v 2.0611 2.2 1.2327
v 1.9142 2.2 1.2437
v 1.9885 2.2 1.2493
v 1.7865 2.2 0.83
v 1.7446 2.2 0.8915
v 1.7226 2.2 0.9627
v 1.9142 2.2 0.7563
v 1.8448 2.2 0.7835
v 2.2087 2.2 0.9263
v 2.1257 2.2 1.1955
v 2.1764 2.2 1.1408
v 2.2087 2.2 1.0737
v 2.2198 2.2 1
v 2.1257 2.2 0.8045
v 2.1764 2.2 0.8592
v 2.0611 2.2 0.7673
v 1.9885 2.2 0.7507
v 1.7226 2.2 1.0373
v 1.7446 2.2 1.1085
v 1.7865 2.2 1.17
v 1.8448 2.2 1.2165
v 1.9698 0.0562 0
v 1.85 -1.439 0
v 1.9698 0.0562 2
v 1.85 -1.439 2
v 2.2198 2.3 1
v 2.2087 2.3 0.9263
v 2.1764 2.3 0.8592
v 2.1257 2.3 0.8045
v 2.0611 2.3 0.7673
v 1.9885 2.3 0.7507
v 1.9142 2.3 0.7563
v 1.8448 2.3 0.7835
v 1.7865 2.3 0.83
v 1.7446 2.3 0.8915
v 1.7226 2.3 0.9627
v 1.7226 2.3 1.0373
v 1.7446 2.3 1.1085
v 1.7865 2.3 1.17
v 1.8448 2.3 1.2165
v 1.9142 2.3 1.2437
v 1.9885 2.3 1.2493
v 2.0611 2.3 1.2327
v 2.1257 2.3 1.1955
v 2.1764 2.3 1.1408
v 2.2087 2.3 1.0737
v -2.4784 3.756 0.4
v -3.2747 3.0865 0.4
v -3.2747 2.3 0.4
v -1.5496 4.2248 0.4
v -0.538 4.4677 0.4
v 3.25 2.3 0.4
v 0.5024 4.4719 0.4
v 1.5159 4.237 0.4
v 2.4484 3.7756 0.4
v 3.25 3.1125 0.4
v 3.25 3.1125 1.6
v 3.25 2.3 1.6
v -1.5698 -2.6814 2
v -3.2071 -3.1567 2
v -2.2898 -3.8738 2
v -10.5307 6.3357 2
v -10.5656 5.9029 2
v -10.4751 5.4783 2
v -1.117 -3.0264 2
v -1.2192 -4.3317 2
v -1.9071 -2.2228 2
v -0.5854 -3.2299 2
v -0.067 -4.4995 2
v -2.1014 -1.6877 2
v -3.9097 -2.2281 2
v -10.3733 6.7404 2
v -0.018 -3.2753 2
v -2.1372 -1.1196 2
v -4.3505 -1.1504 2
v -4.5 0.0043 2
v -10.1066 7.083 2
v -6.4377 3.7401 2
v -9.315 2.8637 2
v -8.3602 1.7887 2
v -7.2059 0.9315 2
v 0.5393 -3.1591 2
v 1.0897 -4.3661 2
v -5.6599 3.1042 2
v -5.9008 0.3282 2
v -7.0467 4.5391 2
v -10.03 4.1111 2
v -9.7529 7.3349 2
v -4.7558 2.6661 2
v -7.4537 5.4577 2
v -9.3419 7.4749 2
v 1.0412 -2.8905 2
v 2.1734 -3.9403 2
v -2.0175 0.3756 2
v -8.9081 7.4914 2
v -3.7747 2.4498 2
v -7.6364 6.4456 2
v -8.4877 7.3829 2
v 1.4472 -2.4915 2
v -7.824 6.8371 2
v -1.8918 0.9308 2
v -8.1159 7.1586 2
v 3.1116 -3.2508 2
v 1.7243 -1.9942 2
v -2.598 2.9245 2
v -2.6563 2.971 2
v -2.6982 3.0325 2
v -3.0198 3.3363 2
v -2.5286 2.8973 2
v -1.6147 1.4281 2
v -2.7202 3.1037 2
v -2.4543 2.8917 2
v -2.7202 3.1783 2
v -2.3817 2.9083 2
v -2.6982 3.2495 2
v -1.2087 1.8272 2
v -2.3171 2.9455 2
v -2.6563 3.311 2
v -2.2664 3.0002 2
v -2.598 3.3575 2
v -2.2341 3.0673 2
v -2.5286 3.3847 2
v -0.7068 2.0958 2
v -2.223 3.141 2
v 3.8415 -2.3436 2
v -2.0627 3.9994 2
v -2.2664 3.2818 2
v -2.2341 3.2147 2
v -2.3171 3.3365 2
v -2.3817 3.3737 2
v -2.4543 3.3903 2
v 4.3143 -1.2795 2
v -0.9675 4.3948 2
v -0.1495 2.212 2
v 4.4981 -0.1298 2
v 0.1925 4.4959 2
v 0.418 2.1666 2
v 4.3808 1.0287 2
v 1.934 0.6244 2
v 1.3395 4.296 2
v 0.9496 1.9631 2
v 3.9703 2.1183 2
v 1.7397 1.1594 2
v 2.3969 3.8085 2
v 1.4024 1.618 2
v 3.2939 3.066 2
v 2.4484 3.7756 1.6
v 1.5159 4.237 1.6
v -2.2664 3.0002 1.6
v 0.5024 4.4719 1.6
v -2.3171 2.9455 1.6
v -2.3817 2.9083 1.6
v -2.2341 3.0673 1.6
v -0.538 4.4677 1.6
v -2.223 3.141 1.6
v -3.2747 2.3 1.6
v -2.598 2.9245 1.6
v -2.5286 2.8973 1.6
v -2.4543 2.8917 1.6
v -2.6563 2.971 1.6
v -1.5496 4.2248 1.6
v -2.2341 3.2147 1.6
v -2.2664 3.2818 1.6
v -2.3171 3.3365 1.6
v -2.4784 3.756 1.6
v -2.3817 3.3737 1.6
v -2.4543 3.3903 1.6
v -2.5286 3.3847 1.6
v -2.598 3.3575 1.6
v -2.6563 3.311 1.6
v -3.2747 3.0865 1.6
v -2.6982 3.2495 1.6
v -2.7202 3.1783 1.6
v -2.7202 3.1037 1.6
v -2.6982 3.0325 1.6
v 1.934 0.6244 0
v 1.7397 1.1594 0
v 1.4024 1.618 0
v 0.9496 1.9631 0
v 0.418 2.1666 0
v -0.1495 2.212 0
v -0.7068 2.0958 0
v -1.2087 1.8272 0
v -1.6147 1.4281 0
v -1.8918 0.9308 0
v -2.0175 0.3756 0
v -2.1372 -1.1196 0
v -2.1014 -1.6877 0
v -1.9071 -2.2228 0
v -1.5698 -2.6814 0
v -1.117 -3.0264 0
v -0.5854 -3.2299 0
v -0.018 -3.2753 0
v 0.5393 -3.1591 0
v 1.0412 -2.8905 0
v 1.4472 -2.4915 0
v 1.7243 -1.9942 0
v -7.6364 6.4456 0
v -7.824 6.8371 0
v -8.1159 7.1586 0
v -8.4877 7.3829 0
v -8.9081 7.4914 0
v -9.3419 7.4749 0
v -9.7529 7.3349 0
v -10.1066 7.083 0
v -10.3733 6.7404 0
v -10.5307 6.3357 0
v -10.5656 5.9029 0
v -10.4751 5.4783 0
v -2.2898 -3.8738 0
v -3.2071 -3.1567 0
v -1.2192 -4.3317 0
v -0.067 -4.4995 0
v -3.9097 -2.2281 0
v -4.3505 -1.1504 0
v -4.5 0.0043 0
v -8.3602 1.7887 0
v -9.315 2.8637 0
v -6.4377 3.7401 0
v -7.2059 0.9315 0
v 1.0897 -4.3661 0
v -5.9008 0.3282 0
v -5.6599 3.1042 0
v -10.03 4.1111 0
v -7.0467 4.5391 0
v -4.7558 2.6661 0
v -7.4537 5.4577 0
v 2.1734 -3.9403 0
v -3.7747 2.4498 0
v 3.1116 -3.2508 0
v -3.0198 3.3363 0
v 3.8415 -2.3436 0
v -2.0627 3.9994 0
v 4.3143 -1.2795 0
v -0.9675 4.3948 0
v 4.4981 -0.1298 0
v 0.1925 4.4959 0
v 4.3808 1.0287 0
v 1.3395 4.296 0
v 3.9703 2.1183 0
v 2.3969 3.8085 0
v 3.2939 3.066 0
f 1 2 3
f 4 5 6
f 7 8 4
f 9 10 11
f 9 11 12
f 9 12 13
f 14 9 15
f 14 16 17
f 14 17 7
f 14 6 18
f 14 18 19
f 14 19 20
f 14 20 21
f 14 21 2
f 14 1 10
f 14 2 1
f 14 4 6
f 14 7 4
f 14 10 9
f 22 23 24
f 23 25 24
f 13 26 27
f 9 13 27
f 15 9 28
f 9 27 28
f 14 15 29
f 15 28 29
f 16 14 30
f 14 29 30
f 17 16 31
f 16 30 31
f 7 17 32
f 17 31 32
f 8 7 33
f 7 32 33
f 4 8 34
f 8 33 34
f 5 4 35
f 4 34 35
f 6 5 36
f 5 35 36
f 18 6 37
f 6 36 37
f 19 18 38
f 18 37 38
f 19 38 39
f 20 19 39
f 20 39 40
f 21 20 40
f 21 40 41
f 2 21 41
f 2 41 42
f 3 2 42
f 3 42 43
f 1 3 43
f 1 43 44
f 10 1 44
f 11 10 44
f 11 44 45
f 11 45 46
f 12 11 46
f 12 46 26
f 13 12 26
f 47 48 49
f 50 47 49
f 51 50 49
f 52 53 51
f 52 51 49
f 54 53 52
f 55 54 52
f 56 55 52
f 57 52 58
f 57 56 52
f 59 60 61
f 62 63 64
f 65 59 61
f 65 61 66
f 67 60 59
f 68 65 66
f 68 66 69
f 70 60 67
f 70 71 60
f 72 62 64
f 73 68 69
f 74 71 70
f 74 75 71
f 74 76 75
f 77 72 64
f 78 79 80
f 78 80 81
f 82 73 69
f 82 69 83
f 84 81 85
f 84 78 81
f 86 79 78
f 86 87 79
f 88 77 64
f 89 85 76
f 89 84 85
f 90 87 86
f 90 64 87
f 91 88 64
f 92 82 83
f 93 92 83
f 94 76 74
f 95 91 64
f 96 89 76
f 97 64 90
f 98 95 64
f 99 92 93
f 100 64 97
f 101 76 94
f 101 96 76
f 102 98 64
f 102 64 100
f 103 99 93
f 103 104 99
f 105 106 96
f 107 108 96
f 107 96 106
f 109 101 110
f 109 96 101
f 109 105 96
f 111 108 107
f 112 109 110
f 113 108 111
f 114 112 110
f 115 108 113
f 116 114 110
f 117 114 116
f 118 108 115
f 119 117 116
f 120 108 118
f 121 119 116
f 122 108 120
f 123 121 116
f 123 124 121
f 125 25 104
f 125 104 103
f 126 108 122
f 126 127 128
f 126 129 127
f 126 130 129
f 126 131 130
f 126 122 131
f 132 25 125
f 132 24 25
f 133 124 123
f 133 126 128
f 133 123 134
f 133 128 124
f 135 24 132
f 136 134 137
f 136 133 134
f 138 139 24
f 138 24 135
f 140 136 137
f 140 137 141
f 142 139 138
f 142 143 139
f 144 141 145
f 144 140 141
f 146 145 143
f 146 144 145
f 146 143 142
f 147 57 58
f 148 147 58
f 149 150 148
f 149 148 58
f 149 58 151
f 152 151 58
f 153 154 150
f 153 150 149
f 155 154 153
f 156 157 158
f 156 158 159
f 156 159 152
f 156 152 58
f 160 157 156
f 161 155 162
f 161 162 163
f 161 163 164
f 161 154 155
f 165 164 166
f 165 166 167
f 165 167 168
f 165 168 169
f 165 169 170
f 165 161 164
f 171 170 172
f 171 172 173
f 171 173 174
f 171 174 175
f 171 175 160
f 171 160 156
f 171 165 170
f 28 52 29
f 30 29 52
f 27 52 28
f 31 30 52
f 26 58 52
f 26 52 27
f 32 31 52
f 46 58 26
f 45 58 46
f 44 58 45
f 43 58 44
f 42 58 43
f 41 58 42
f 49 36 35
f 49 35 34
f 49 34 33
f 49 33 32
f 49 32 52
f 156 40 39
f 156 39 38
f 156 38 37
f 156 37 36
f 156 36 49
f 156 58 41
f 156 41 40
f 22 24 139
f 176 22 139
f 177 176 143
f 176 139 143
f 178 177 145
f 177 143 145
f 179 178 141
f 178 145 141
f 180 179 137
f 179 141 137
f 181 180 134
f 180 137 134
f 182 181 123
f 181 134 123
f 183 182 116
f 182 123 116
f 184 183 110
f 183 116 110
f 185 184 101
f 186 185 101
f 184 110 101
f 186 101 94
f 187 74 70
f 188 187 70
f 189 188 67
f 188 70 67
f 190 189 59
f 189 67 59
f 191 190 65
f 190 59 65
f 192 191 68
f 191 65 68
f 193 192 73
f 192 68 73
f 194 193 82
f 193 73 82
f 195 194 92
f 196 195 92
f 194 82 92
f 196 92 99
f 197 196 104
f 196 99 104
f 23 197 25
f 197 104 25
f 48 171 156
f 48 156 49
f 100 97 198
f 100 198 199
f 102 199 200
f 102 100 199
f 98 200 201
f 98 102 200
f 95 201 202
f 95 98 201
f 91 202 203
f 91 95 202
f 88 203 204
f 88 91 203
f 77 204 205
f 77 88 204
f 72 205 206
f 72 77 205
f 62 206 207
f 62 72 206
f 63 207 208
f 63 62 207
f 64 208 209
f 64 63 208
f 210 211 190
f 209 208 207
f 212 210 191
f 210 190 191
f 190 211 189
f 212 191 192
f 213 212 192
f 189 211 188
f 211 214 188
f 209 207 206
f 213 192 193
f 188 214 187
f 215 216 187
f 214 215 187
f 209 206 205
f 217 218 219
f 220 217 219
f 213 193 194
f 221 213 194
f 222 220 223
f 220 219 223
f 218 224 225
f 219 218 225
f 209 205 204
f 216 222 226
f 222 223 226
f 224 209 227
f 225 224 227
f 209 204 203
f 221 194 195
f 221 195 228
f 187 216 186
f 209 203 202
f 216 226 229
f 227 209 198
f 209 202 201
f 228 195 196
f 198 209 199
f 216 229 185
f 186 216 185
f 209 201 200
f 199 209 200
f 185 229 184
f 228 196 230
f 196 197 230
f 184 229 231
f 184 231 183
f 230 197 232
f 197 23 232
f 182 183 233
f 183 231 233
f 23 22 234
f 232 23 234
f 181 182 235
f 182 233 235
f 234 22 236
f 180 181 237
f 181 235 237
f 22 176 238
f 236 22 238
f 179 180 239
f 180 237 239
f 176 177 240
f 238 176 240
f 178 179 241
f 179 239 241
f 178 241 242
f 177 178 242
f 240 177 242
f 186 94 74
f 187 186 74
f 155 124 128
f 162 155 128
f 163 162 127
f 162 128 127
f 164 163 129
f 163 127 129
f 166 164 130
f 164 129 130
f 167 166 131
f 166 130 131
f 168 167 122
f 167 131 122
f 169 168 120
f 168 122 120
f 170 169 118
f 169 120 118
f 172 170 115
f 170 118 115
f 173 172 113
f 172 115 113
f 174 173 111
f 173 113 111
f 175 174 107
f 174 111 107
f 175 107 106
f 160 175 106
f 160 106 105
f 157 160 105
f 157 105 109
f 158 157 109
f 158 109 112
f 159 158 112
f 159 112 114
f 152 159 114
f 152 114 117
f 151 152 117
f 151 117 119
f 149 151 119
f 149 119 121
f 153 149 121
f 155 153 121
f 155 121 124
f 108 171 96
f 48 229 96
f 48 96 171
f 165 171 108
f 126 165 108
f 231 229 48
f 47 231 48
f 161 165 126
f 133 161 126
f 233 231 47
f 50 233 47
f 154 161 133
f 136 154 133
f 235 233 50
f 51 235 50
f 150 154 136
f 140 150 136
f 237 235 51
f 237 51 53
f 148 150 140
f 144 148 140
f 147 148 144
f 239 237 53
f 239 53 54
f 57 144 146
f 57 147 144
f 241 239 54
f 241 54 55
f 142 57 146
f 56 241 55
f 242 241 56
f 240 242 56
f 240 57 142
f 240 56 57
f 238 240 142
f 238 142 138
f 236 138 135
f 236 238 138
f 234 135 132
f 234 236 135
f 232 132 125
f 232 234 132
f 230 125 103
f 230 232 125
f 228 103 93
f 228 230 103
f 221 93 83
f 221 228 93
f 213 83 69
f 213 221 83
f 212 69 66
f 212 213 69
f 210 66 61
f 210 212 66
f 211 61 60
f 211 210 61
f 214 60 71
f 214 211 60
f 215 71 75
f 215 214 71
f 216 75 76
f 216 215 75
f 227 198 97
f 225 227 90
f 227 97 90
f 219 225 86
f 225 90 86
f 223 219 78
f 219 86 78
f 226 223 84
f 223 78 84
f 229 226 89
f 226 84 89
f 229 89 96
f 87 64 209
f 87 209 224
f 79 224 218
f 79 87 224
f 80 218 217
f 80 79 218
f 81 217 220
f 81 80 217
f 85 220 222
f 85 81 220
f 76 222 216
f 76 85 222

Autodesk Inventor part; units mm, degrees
ref_plane "YZ Plane" through (0, 0, 0) normal (1, 0, 0) x (0, 1, 0)
ref_plane "XY Plane" through (0, 0, 0) normal (0, 0, 1) x (1, 0, 0)
sketch "Esboço1" plane through (0, 0, 0) normal (0, 0, 1) x (1, 0, 0)
  circle A0 centre (0, 0) radius 4.5
  dimension "d0" = 9
extrude "Extrusão1" add sketch "Esboço1" along normal blind 2
sketch "Esboço2" plane through (0, 0, 2) normal (0, 0, 1) x (1, 0, 0)
  circle A0 centre (0, 0) radius 4.5 projected
  arc A1 (-10.4751, 5.4783) -> (-4.5, 0.0043) centre (-3.6315, 6.9502) ccw
  arc A2 (-7.6364, 6.4456) -> (-10.4751, 5.4783) centre (-9.0687, 6) ccw
  arc A3 (-7.6364, 6.4456) -> (-3.7747, 2.4498) centre (-3.3457, 6.7283) ccw
  dimension "d3" = 7
  dimension "d4" = 4.3
  dimension "d5" = 1.5
  dimension "d6" = 6
extrude "Extrusão2" add sketch "Esboço2" against normal blind 2 contours A0 A1 A2 A3
sketch "Esboço4" plane through (0, 0, 2) normal (0, 0, 1) x (1, 0, 0)
  line L0 (-0.335, -0.9422) -> (0.1675, 0.4711) construction
  line L1 (-2.0175, 0.3756) -> (-2.1372, -1.1196)
  line L2 (1.85, -1.439) -> (1.9698, 0.0562)
  arc A0 (1.9698, 0.0562) -> (-2.0175, 0.3756) centre (-0.0239, 0.2159) ccw
  arc A1 (-2.1372, -1.1196) -> (1.85, -1.439) centre (-0.1436, -1.2793) ccw
  point P0 (-0.0837, -0.2356)
  dimension "d11" = 1.5
  dimension "d12" = 4
extrude "Extrusão3" cut sketch "Esboço4" against normal blind 2
ref_plane "Plano de trabalho1" through (0, 4.5, 0) normal (0, 1, 0) x (-1, 0, 0)
sketch "Esboço5" plane through (0, 4.5, 0) normal (0, 1, 0) x (-1, 0, 0)
  line L0 (-3.25, 1.6) -> (3.2747, 1.6)
  line L1 (3.2747, 1.6) -> (3.2747, 0.4)
  line L2 (3.2747, 0.4) -> (-3.25, 0.4)
  line L3 (-3.25, 0.4) -> (-3.25, 1.6)
  line L4 (-3.25, 1.6) -> (3.2747, 0.4) construction
  line L5 (3.2747, 1.6) -> (-3.25, 0.4) construction
  line L6 (4.5, 0) -> (-4.5, 0) projected
  line L7 (4.5, 2) -> (-4.5, 2) projected
  line L8 (3.7747, 0) -> (3.7747, 2) projected
  line L9 (-4.5, 2) -> (-4.5, 0)
  line L10 (-4.5, 0) -> (-4.5, 2) projected
  point P0 (0, 0)
  point P1 (0.0124, 1)
  dimension "d16" = 0.4
  dimension "d17" = 0.4
  dimension "d18" = 0.5
  dimension "d19" = 1.25
extrude "Extrusão4" cut sketch "Esboço5" against normal blind 2.2 contours L0 L1 L2 L3
sketch "Esboço6" plane through (0, 0, 2) normal (0, 0, 1) x (1, 0, 0)
  circle A0 centre (-2.473, 3.141) radius 0.25
  line L0 (0, -6.9) -> (0, 9.9) projected
  line L1 (-13.5824, 0) -> (7.5137, 0) projected
  point P0 (0, 0)
  dimension "d22" = 0.5
  dimension "d28" = 2.473
  dimension "d29" = 3.141
extrude "Extrusão5" cut sketch "Esboço6" against normal blind 0.5
sketch "Esboço8" plane through (0, 2.3, 0) normal (0, 1, 0) x (1, 0, 0)
  line L0 (1.9698, -2) -> (1.9698, 0) projected
  circle A0 centre (1.9698, -1) radius 0.25
  point P0 (0, 0)
  dimension "d30" = 0.5
extrude "Extrusão7" cut sketch "Esboço8" against normal blind 0.1
properties material "Liga de Nickel-Copper 400"
